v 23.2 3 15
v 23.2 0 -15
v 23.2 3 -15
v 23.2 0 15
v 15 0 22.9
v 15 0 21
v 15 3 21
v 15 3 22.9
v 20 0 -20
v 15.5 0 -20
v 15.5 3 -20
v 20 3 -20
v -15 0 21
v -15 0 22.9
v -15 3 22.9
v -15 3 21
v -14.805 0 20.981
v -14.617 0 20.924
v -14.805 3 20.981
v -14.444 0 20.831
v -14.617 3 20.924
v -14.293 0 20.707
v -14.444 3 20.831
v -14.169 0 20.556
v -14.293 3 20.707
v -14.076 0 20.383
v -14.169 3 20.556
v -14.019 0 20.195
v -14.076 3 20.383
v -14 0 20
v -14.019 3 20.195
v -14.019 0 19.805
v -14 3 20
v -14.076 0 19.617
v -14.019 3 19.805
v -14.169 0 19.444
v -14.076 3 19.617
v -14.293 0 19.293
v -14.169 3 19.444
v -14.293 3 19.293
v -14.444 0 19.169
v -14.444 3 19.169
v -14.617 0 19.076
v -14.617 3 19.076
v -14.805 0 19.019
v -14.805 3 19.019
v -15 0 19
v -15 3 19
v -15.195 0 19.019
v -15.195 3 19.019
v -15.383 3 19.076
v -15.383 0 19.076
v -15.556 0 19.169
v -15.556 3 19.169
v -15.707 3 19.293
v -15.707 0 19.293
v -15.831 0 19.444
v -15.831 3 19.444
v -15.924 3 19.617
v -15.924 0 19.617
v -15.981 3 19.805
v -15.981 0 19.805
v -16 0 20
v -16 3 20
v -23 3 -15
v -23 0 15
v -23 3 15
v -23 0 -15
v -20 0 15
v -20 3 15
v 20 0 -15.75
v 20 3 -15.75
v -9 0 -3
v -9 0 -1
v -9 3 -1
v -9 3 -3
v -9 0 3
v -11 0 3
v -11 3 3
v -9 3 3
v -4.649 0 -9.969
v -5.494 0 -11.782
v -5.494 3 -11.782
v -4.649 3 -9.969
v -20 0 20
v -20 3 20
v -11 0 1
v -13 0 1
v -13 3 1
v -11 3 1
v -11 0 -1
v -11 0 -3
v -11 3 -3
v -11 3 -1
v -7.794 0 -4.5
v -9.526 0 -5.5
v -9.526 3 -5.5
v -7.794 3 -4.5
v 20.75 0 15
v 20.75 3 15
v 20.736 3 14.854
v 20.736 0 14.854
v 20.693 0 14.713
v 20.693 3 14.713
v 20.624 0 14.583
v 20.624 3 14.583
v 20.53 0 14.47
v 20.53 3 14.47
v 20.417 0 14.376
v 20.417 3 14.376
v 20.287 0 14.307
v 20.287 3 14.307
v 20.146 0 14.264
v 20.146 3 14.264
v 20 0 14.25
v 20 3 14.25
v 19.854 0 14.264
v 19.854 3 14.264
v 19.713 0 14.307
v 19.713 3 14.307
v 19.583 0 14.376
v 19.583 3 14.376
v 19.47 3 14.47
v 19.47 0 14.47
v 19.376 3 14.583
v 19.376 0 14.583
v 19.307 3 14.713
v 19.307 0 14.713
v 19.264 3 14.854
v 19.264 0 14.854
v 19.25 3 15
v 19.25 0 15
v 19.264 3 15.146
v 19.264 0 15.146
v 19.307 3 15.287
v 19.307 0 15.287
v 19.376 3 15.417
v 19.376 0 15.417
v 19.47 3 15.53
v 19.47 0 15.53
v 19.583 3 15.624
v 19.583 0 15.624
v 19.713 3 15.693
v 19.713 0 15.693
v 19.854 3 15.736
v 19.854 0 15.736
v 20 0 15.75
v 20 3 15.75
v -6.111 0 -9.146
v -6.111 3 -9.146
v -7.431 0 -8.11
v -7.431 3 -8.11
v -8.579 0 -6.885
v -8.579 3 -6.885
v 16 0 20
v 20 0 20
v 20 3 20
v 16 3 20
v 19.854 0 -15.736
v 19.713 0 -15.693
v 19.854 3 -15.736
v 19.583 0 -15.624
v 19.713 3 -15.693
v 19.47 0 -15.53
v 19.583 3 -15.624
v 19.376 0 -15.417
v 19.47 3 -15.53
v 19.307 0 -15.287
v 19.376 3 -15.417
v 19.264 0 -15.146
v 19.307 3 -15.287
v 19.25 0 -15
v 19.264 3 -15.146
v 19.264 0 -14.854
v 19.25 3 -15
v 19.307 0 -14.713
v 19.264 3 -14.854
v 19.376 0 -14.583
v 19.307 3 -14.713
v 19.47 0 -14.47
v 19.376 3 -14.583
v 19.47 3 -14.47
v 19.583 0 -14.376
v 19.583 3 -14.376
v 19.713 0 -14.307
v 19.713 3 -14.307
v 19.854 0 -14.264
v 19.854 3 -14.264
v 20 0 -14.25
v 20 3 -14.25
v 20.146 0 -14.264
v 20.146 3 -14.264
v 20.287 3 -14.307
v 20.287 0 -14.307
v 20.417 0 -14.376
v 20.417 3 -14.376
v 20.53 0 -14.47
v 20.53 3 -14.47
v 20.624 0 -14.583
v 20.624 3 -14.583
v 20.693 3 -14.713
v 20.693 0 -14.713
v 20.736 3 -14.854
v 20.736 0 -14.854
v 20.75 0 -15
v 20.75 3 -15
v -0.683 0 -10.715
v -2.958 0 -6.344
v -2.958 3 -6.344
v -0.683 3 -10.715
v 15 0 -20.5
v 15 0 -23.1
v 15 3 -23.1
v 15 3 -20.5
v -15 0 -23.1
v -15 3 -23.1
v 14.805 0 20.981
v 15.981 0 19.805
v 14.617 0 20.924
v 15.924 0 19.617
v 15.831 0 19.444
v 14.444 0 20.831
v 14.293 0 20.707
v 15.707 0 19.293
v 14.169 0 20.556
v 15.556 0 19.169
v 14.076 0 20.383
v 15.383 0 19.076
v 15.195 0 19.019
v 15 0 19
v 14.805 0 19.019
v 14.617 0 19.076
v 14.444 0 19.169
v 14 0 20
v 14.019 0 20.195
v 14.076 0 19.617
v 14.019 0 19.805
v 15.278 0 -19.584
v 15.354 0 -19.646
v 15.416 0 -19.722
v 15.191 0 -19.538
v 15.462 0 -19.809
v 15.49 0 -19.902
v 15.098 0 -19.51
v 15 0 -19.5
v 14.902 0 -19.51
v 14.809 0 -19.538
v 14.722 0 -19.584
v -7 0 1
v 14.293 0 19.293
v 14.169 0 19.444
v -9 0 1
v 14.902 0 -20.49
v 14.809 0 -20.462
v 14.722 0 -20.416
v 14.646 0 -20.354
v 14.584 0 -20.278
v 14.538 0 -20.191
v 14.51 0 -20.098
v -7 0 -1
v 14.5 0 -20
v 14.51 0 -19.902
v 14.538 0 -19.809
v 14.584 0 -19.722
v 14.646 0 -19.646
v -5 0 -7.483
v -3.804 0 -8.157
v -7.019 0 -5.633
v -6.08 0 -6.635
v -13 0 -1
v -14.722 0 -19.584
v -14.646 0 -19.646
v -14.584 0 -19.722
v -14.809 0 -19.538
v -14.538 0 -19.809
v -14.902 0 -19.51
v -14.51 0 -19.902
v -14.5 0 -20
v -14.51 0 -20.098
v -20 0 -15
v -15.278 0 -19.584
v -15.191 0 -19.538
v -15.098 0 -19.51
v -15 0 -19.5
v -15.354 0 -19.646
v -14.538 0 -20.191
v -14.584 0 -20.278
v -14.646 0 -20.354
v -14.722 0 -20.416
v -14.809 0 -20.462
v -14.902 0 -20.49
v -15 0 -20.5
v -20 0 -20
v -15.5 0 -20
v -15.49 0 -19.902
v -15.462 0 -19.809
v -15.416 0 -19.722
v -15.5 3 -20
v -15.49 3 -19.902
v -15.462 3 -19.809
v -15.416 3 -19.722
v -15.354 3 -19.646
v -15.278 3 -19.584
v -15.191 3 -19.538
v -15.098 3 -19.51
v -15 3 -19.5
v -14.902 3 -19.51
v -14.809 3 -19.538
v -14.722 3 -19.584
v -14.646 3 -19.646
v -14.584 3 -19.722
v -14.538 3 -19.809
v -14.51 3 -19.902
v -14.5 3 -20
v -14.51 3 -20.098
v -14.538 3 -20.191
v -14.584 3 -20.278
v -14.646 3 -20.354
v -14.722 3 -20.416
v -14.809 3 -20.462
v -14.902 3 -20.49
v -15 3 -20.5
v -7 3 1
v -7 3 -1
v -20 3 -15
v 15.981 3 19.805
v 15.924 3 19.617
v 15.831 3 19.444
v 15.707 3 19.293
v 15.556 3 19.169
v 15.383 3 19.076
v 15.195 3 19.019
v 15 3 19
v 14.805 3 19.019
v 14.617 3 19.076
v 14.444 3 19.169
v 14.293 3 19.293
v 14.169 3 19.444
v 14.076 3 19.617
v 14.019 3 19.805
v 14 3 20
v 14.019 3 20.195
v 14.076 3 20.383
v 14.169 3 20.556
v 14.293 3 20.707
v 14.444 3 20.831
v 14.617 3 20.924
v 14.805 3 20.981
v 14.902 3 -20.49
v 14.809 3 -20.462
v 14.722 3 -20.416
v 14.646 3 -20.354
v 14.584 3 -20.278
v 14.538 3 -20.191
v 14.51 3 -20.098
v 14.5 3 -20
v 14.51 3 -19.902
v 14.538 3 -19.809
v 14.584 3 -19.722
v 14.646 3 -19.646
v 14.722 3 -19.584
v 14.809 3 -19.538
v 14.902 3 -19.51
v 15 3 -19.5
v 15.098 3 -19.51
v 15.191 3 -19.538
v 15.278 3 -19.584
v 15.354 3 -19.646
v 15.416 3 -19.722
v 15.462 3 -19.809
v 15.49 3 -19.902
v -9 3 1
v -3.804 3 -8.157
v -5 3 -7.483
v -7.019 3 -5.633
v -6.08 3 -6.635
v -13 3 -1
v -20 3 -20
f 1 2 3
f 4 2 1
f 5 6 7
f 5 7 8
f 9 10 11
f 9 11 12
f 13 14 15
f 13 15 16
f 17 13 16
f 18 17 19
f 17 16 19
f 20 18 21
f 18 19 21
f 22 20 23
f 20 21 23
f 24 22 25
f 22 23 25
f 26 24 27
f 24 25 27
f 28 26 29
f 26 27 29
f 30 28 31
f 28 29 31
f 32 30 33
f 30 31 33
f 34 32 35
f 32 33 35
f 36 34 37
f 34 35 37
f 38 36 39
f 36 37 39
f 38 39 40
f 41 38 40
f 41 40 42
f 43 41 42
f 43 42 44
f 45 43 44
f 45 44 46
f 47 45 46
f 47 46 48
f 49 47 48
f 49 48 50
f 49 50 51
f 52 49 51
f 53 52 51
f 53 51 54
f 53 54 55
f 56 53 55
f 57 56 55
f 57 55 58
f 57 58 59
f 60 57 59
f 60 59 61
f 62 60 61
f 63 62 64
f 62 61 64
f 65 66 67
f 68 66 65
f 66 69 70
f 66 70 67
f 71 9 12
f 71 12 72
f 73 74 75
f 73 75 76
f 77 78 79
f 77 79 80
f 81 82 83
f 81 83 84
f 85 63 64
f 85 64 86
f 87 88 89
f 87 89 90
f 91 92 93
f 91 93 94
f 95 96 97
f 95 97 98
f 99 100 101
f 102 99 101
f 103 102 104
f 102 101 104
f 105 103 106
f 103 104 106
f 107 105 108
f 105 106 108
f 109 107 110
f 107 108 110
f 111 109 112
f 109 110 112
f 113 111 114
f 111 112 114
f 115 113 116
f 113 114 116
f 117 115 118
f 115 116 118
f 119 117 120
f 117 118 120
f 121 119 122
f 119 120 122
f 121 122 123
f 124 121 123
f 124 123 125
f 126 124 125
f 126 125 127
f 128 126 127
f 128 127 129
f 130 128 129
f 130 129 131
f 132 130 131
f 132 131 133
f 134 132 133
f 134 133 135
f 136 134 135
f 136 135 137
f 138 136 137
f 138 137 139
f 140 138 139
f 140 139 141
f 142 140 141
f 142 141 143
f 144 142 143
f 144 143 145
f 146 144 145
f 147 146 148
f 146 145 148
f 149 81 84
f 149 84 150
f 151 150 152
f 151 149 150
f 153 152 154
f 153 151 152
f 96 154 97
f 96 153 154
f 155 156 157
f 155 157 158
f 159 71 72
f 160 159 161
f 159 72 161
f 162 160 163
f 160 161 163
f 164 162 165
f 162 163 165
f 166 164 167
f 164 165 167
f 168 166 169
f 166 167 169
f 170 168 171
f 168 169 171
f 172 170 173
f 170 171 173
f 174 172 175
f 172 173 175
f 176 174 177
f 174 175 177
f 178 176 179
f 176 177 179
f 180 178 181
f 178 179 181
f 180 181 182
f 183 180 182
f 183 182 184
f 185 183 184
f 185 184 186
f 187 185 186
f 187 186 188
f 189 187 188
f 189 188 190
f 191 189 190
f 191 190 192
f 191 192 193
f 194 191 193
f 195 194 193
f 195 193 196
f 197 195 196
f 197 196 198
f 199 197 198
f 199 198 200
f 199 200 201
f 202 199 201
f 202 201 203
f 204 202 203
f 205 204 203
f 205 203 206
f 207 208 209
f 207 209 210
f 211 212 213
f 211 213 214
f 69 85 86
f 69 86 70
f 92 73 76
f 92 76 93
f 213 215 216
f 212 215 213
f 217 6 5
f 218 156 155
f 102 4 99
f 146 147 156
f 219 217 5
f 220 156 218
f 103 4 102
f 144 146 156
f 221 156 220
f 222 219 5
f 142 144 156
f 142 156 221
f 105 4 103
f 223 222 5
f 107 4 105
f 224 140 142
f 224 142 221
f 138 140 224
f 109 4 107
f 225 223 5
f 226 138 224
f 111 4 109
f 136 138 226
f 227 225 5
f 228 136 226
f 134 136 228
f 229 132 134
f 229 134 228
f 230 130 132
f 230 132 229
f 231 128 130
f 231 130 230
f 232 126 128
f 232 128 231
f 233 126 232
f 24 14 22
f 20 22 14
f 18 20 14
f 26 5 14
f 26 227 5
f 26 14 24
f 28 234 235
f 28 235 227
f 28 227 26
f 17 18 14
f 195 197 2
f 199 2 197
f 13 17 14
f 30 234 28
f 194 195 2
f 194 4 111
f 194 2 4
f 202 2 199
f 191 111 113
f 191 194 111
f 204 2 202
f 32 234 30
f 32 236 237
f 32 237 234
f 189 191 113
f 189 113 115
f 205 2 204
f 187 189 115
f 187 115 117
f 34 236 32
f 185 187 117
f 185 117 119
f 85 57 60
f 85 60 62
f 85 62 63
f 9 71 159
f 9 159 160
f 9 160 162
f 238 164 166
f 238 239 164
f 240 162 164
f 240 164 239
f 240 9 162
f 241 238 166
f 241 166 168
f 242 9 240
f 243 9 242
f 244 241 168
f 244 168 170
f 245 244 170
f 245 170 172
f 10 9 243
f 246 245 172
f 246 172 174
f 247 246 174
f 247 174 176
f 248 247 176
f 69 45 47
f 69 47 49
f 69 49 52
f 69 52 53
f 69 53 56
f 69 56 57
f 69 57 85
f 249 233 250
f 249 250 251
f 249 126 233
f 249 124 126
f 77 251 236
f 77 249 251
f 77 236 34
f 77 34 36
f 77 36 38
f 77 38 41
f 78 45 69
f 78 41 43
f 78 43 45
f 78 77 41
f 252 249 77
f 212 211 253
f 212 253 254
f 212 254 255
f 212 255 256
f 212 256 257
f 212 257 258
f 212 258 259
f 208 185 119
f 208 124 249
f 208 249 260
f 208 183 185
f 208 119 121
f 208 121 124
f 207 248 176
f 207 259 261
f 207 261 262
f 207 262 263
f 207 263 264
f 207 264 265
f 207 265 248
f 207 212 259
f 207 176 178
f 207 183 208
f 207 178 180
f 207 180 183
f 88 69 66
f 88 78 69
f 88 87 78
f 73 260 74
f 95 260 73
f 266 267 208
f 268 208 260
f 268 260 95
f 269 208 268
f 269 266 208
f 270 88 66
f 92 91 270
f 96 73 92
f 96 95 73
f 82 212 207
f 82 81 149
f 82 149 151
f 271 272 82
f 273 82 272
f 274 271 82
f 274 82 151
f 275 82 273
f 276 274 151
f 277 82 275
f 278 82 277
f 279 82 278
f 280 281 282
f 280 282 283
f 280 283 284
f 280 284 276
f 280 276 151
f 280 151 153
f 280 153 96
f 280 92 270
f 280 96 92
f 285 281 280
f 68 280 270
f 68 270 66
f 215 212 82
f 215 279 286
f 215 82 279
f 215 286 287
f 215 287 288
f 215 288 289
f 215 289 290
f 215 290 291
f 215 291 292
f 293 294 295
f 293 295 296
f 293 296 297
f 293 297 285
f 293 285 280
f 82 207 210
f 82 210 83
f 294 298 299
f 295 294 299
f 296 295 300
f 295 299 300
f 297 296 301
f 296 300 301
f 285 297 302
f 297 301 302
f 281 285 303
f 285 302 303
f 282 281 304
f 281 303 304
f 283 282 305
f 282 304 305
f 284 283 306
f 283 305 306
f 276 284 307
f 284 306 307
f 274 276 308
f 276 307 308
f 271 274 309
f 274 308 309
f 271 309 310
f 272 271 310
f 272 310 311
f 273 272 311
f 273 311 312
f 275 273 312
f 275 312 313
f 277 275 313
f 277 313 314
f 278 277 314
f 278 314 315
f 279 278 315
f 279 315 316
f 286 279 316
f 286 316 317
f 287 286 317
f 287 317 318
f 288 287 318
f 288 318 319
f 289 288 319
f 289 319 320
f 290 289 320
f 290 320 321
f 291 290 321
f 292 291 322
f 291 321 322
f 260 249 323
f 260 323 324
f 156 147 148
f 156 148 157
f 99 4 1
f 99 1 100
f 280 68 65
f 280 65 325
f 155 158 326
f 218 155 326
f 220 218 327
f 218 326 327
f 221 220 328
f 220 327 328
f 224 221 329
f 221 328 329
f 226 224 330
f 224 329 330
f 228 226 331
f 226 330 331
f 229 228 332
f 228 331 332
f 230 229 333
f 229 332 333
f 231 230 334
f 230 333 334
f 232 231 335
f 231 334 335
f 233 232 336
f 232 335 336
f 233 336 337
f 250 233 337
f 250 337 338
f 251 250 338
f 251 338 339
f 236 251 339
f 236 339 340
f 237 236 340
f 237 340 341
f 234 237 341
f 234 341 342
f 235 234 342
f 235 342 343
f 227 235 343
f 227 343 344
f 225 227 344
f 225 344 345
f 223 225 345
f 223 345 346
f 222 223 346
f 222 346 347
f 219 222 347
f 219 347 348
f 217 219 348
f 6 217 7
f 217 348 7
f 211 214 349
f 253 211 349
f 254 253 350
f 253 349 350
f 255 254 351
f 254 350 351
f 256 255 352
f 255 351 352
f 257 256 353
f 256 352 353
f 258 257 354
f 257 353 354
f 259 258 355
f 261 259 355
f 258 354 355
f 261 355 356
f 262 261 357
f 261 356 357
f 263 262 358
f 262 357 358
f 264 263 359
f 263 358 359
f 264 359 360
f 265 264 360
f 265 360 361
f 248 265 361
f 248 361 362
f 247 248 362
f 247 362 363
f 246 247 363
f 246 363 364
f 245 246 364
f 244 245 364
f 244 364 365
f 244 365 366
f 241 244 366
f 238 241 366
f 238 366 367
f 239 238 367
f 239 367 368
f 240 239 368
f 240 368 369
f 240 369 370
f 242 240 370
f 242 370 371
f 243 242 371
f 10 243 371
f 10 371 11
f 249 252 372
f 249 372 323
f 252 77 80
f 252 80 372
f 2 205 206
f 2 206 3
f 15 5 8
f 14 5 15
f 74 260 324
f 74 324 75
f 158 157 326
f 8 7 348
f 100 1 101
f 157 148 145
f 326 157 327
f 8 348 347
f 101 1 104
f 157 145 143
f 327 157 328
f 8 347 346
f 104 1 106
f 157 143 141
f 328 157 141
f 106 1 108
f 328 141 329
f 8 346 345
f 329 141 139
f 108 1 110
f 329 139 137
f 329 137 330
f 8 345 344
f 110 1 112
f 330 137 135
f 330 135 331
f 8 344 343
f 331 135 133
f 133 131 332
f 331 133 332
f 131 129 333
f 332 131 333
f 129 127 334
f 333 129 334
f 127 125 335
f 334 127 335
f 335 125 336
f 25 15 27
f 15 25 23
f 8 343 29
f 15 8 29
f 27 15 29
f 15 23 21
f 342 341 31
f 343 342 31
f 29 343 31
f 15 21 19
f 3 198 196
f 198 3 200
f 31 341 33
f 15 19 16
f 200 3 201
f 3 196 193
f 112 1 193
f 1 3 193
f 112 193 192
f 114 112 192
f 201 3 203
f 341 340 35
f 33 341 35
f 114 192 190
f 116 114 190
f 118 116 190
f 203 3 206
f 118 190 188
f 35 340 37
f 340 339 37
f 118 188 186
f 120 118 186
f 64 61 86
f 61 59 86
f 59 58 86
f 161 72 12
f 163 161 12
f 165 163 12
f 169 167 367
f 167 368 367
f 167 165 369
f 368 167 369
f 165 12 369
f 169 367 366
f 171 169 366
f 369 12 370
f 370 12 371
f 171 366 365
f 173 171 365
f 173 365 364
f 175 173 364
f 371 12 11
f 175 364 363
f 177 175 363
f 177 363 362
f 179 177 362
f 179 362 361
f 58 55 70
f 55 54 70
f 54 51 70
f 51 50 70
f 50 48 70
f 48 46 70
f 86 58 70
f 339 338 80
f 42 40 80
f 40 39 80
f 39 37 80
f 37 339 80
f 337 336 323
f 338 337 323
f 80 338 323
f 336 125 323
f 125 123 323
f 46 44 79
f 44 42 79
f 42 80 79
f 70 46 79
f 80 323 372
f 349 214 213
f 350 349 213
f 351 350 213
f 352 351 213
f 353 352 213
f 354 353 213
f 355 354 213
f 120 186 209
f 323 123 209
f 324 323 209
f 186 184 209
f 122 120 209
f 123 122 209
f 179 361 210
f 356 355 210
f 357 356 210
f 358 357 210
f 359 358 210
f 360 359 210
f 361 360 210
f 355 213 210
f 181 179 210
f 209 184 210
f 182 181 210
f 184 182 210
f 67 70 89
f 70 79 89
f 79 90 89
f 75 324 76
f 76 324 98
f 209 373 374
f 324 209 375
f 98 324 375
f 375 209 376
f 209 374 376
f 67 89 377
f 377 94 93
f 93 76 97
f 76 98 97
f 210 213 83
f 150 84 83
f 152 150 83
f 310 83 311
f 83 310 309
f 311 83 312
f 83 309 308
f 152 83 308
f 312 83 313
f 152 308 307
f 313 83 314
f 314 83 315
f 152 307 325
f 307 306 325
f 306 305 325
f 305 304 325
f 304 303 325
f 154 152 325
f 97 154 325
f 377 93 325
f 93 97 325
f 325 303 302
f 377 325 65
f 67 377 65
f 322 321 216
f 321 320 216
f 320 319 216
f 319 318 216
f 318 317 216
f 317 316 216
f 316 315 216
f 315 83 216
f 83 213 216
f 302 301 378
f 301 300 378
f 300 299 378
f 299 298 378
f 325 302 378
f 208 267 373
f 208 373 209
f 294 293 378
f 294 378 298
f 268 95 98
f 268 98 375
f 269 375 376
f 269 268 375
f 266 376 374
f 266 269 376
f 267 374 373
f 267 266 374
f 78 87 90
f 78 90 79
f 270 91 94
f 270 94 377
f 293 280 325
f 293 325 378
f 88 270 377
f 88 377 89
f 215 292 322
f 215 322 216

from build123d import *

# Parameters (mm, degrees)
BOSS_EXTRUDE1_DEPTH = 3
SKETCH4_R           = 0.5
SKETCH4_R_2         = 0.75
SKETCH4_R_3         = 1
CUT_EXTRUDE1_DEPTH  = 33.876283245


with BuildPart() as part:
    # Sketch1 → Boss-Extrude1 (new body)
    with BuildSketch(Plane(origin=(0, 0, 0), x_dir=(1, 0, 0), z_dir=(0, 1, 0))):
        Polygon((-20, -20), (-20, -15), (-23, -15), (-23, 15), (-20, 15), (-20, 20), (-15, 20), (-15, 23.1), (15, 23.1), (15, 20), (20, 20), (20, 15), (23.2, 15), (23.2, -15), (20, -15), (20, -20), (15, -20), (15, -22.9), (-15, -22.9), (-15, -20), align=None)
        Polygon((-13, -1), (-11, -1), (-11, -3), (-9, -3), (-9, -1), (-7, -1), (-7, 1), (-9, 1), (-9, 3), (-11, 3), (-11, 1), (-13, 1), align=None, mode=Mode.SUBTRACT)
        with BuildLine():
            Line((-9.526279442, 5.5), (-7.794228634, 4.5))
            ThreePointArc((-7.794228634, 4.5), (-6.080311869, 6.635496031), (-3.803564356, 8.156770083))
            Line((-3.803564356, 8.156770083), (-2.958327832, 6.344154509))
            Line((-2.958327832, 6.344154509), (-0.682812706, 10.715378396))
            Line((-0.682812706, 10.715378396), (-5.494037403, 11.782001231))
            Line((-5.494037403, 11.782001231), (-4.648800879, 9.969385657))
            ThreePointArc((-4.648800879, 9.969385657), (-7.431492284, 8.110050705), (-9.526279442, 5.5))
        make_face(mode=Mode.SUBTRACT)
    extrude(amount=BOSS_EXTRUDE1_DEPTH)

    # Sketch4 → Cut-Extrude1 (cut, through all)
    with BuildSketch(Plane(origin=(0, 3, 0), x_dir=(1, 0, 0), z_dir=(0, 1, 0))):
        with Locations((-15, 20)):
            Circle(SKETCH4_R)
        with Locations((15, 20)):
            Circle(SKETCH4_R)
        with Locations((20, 15)):
            Circle(SKETCH4_R_2)
        with Locations((20, -15)):
            Circle(SKETCH4_R_2)
        with Locations((15, -20)):
            Circle(SKETCH4_R_3)
        with Locations((-15, -20)):
            Circle(SKETCH4_R_3)
    extrude(amount=-CUT_EXTRUDE1_DEPTH, mode=Mode.SUBTRACT)


solid = part.part
